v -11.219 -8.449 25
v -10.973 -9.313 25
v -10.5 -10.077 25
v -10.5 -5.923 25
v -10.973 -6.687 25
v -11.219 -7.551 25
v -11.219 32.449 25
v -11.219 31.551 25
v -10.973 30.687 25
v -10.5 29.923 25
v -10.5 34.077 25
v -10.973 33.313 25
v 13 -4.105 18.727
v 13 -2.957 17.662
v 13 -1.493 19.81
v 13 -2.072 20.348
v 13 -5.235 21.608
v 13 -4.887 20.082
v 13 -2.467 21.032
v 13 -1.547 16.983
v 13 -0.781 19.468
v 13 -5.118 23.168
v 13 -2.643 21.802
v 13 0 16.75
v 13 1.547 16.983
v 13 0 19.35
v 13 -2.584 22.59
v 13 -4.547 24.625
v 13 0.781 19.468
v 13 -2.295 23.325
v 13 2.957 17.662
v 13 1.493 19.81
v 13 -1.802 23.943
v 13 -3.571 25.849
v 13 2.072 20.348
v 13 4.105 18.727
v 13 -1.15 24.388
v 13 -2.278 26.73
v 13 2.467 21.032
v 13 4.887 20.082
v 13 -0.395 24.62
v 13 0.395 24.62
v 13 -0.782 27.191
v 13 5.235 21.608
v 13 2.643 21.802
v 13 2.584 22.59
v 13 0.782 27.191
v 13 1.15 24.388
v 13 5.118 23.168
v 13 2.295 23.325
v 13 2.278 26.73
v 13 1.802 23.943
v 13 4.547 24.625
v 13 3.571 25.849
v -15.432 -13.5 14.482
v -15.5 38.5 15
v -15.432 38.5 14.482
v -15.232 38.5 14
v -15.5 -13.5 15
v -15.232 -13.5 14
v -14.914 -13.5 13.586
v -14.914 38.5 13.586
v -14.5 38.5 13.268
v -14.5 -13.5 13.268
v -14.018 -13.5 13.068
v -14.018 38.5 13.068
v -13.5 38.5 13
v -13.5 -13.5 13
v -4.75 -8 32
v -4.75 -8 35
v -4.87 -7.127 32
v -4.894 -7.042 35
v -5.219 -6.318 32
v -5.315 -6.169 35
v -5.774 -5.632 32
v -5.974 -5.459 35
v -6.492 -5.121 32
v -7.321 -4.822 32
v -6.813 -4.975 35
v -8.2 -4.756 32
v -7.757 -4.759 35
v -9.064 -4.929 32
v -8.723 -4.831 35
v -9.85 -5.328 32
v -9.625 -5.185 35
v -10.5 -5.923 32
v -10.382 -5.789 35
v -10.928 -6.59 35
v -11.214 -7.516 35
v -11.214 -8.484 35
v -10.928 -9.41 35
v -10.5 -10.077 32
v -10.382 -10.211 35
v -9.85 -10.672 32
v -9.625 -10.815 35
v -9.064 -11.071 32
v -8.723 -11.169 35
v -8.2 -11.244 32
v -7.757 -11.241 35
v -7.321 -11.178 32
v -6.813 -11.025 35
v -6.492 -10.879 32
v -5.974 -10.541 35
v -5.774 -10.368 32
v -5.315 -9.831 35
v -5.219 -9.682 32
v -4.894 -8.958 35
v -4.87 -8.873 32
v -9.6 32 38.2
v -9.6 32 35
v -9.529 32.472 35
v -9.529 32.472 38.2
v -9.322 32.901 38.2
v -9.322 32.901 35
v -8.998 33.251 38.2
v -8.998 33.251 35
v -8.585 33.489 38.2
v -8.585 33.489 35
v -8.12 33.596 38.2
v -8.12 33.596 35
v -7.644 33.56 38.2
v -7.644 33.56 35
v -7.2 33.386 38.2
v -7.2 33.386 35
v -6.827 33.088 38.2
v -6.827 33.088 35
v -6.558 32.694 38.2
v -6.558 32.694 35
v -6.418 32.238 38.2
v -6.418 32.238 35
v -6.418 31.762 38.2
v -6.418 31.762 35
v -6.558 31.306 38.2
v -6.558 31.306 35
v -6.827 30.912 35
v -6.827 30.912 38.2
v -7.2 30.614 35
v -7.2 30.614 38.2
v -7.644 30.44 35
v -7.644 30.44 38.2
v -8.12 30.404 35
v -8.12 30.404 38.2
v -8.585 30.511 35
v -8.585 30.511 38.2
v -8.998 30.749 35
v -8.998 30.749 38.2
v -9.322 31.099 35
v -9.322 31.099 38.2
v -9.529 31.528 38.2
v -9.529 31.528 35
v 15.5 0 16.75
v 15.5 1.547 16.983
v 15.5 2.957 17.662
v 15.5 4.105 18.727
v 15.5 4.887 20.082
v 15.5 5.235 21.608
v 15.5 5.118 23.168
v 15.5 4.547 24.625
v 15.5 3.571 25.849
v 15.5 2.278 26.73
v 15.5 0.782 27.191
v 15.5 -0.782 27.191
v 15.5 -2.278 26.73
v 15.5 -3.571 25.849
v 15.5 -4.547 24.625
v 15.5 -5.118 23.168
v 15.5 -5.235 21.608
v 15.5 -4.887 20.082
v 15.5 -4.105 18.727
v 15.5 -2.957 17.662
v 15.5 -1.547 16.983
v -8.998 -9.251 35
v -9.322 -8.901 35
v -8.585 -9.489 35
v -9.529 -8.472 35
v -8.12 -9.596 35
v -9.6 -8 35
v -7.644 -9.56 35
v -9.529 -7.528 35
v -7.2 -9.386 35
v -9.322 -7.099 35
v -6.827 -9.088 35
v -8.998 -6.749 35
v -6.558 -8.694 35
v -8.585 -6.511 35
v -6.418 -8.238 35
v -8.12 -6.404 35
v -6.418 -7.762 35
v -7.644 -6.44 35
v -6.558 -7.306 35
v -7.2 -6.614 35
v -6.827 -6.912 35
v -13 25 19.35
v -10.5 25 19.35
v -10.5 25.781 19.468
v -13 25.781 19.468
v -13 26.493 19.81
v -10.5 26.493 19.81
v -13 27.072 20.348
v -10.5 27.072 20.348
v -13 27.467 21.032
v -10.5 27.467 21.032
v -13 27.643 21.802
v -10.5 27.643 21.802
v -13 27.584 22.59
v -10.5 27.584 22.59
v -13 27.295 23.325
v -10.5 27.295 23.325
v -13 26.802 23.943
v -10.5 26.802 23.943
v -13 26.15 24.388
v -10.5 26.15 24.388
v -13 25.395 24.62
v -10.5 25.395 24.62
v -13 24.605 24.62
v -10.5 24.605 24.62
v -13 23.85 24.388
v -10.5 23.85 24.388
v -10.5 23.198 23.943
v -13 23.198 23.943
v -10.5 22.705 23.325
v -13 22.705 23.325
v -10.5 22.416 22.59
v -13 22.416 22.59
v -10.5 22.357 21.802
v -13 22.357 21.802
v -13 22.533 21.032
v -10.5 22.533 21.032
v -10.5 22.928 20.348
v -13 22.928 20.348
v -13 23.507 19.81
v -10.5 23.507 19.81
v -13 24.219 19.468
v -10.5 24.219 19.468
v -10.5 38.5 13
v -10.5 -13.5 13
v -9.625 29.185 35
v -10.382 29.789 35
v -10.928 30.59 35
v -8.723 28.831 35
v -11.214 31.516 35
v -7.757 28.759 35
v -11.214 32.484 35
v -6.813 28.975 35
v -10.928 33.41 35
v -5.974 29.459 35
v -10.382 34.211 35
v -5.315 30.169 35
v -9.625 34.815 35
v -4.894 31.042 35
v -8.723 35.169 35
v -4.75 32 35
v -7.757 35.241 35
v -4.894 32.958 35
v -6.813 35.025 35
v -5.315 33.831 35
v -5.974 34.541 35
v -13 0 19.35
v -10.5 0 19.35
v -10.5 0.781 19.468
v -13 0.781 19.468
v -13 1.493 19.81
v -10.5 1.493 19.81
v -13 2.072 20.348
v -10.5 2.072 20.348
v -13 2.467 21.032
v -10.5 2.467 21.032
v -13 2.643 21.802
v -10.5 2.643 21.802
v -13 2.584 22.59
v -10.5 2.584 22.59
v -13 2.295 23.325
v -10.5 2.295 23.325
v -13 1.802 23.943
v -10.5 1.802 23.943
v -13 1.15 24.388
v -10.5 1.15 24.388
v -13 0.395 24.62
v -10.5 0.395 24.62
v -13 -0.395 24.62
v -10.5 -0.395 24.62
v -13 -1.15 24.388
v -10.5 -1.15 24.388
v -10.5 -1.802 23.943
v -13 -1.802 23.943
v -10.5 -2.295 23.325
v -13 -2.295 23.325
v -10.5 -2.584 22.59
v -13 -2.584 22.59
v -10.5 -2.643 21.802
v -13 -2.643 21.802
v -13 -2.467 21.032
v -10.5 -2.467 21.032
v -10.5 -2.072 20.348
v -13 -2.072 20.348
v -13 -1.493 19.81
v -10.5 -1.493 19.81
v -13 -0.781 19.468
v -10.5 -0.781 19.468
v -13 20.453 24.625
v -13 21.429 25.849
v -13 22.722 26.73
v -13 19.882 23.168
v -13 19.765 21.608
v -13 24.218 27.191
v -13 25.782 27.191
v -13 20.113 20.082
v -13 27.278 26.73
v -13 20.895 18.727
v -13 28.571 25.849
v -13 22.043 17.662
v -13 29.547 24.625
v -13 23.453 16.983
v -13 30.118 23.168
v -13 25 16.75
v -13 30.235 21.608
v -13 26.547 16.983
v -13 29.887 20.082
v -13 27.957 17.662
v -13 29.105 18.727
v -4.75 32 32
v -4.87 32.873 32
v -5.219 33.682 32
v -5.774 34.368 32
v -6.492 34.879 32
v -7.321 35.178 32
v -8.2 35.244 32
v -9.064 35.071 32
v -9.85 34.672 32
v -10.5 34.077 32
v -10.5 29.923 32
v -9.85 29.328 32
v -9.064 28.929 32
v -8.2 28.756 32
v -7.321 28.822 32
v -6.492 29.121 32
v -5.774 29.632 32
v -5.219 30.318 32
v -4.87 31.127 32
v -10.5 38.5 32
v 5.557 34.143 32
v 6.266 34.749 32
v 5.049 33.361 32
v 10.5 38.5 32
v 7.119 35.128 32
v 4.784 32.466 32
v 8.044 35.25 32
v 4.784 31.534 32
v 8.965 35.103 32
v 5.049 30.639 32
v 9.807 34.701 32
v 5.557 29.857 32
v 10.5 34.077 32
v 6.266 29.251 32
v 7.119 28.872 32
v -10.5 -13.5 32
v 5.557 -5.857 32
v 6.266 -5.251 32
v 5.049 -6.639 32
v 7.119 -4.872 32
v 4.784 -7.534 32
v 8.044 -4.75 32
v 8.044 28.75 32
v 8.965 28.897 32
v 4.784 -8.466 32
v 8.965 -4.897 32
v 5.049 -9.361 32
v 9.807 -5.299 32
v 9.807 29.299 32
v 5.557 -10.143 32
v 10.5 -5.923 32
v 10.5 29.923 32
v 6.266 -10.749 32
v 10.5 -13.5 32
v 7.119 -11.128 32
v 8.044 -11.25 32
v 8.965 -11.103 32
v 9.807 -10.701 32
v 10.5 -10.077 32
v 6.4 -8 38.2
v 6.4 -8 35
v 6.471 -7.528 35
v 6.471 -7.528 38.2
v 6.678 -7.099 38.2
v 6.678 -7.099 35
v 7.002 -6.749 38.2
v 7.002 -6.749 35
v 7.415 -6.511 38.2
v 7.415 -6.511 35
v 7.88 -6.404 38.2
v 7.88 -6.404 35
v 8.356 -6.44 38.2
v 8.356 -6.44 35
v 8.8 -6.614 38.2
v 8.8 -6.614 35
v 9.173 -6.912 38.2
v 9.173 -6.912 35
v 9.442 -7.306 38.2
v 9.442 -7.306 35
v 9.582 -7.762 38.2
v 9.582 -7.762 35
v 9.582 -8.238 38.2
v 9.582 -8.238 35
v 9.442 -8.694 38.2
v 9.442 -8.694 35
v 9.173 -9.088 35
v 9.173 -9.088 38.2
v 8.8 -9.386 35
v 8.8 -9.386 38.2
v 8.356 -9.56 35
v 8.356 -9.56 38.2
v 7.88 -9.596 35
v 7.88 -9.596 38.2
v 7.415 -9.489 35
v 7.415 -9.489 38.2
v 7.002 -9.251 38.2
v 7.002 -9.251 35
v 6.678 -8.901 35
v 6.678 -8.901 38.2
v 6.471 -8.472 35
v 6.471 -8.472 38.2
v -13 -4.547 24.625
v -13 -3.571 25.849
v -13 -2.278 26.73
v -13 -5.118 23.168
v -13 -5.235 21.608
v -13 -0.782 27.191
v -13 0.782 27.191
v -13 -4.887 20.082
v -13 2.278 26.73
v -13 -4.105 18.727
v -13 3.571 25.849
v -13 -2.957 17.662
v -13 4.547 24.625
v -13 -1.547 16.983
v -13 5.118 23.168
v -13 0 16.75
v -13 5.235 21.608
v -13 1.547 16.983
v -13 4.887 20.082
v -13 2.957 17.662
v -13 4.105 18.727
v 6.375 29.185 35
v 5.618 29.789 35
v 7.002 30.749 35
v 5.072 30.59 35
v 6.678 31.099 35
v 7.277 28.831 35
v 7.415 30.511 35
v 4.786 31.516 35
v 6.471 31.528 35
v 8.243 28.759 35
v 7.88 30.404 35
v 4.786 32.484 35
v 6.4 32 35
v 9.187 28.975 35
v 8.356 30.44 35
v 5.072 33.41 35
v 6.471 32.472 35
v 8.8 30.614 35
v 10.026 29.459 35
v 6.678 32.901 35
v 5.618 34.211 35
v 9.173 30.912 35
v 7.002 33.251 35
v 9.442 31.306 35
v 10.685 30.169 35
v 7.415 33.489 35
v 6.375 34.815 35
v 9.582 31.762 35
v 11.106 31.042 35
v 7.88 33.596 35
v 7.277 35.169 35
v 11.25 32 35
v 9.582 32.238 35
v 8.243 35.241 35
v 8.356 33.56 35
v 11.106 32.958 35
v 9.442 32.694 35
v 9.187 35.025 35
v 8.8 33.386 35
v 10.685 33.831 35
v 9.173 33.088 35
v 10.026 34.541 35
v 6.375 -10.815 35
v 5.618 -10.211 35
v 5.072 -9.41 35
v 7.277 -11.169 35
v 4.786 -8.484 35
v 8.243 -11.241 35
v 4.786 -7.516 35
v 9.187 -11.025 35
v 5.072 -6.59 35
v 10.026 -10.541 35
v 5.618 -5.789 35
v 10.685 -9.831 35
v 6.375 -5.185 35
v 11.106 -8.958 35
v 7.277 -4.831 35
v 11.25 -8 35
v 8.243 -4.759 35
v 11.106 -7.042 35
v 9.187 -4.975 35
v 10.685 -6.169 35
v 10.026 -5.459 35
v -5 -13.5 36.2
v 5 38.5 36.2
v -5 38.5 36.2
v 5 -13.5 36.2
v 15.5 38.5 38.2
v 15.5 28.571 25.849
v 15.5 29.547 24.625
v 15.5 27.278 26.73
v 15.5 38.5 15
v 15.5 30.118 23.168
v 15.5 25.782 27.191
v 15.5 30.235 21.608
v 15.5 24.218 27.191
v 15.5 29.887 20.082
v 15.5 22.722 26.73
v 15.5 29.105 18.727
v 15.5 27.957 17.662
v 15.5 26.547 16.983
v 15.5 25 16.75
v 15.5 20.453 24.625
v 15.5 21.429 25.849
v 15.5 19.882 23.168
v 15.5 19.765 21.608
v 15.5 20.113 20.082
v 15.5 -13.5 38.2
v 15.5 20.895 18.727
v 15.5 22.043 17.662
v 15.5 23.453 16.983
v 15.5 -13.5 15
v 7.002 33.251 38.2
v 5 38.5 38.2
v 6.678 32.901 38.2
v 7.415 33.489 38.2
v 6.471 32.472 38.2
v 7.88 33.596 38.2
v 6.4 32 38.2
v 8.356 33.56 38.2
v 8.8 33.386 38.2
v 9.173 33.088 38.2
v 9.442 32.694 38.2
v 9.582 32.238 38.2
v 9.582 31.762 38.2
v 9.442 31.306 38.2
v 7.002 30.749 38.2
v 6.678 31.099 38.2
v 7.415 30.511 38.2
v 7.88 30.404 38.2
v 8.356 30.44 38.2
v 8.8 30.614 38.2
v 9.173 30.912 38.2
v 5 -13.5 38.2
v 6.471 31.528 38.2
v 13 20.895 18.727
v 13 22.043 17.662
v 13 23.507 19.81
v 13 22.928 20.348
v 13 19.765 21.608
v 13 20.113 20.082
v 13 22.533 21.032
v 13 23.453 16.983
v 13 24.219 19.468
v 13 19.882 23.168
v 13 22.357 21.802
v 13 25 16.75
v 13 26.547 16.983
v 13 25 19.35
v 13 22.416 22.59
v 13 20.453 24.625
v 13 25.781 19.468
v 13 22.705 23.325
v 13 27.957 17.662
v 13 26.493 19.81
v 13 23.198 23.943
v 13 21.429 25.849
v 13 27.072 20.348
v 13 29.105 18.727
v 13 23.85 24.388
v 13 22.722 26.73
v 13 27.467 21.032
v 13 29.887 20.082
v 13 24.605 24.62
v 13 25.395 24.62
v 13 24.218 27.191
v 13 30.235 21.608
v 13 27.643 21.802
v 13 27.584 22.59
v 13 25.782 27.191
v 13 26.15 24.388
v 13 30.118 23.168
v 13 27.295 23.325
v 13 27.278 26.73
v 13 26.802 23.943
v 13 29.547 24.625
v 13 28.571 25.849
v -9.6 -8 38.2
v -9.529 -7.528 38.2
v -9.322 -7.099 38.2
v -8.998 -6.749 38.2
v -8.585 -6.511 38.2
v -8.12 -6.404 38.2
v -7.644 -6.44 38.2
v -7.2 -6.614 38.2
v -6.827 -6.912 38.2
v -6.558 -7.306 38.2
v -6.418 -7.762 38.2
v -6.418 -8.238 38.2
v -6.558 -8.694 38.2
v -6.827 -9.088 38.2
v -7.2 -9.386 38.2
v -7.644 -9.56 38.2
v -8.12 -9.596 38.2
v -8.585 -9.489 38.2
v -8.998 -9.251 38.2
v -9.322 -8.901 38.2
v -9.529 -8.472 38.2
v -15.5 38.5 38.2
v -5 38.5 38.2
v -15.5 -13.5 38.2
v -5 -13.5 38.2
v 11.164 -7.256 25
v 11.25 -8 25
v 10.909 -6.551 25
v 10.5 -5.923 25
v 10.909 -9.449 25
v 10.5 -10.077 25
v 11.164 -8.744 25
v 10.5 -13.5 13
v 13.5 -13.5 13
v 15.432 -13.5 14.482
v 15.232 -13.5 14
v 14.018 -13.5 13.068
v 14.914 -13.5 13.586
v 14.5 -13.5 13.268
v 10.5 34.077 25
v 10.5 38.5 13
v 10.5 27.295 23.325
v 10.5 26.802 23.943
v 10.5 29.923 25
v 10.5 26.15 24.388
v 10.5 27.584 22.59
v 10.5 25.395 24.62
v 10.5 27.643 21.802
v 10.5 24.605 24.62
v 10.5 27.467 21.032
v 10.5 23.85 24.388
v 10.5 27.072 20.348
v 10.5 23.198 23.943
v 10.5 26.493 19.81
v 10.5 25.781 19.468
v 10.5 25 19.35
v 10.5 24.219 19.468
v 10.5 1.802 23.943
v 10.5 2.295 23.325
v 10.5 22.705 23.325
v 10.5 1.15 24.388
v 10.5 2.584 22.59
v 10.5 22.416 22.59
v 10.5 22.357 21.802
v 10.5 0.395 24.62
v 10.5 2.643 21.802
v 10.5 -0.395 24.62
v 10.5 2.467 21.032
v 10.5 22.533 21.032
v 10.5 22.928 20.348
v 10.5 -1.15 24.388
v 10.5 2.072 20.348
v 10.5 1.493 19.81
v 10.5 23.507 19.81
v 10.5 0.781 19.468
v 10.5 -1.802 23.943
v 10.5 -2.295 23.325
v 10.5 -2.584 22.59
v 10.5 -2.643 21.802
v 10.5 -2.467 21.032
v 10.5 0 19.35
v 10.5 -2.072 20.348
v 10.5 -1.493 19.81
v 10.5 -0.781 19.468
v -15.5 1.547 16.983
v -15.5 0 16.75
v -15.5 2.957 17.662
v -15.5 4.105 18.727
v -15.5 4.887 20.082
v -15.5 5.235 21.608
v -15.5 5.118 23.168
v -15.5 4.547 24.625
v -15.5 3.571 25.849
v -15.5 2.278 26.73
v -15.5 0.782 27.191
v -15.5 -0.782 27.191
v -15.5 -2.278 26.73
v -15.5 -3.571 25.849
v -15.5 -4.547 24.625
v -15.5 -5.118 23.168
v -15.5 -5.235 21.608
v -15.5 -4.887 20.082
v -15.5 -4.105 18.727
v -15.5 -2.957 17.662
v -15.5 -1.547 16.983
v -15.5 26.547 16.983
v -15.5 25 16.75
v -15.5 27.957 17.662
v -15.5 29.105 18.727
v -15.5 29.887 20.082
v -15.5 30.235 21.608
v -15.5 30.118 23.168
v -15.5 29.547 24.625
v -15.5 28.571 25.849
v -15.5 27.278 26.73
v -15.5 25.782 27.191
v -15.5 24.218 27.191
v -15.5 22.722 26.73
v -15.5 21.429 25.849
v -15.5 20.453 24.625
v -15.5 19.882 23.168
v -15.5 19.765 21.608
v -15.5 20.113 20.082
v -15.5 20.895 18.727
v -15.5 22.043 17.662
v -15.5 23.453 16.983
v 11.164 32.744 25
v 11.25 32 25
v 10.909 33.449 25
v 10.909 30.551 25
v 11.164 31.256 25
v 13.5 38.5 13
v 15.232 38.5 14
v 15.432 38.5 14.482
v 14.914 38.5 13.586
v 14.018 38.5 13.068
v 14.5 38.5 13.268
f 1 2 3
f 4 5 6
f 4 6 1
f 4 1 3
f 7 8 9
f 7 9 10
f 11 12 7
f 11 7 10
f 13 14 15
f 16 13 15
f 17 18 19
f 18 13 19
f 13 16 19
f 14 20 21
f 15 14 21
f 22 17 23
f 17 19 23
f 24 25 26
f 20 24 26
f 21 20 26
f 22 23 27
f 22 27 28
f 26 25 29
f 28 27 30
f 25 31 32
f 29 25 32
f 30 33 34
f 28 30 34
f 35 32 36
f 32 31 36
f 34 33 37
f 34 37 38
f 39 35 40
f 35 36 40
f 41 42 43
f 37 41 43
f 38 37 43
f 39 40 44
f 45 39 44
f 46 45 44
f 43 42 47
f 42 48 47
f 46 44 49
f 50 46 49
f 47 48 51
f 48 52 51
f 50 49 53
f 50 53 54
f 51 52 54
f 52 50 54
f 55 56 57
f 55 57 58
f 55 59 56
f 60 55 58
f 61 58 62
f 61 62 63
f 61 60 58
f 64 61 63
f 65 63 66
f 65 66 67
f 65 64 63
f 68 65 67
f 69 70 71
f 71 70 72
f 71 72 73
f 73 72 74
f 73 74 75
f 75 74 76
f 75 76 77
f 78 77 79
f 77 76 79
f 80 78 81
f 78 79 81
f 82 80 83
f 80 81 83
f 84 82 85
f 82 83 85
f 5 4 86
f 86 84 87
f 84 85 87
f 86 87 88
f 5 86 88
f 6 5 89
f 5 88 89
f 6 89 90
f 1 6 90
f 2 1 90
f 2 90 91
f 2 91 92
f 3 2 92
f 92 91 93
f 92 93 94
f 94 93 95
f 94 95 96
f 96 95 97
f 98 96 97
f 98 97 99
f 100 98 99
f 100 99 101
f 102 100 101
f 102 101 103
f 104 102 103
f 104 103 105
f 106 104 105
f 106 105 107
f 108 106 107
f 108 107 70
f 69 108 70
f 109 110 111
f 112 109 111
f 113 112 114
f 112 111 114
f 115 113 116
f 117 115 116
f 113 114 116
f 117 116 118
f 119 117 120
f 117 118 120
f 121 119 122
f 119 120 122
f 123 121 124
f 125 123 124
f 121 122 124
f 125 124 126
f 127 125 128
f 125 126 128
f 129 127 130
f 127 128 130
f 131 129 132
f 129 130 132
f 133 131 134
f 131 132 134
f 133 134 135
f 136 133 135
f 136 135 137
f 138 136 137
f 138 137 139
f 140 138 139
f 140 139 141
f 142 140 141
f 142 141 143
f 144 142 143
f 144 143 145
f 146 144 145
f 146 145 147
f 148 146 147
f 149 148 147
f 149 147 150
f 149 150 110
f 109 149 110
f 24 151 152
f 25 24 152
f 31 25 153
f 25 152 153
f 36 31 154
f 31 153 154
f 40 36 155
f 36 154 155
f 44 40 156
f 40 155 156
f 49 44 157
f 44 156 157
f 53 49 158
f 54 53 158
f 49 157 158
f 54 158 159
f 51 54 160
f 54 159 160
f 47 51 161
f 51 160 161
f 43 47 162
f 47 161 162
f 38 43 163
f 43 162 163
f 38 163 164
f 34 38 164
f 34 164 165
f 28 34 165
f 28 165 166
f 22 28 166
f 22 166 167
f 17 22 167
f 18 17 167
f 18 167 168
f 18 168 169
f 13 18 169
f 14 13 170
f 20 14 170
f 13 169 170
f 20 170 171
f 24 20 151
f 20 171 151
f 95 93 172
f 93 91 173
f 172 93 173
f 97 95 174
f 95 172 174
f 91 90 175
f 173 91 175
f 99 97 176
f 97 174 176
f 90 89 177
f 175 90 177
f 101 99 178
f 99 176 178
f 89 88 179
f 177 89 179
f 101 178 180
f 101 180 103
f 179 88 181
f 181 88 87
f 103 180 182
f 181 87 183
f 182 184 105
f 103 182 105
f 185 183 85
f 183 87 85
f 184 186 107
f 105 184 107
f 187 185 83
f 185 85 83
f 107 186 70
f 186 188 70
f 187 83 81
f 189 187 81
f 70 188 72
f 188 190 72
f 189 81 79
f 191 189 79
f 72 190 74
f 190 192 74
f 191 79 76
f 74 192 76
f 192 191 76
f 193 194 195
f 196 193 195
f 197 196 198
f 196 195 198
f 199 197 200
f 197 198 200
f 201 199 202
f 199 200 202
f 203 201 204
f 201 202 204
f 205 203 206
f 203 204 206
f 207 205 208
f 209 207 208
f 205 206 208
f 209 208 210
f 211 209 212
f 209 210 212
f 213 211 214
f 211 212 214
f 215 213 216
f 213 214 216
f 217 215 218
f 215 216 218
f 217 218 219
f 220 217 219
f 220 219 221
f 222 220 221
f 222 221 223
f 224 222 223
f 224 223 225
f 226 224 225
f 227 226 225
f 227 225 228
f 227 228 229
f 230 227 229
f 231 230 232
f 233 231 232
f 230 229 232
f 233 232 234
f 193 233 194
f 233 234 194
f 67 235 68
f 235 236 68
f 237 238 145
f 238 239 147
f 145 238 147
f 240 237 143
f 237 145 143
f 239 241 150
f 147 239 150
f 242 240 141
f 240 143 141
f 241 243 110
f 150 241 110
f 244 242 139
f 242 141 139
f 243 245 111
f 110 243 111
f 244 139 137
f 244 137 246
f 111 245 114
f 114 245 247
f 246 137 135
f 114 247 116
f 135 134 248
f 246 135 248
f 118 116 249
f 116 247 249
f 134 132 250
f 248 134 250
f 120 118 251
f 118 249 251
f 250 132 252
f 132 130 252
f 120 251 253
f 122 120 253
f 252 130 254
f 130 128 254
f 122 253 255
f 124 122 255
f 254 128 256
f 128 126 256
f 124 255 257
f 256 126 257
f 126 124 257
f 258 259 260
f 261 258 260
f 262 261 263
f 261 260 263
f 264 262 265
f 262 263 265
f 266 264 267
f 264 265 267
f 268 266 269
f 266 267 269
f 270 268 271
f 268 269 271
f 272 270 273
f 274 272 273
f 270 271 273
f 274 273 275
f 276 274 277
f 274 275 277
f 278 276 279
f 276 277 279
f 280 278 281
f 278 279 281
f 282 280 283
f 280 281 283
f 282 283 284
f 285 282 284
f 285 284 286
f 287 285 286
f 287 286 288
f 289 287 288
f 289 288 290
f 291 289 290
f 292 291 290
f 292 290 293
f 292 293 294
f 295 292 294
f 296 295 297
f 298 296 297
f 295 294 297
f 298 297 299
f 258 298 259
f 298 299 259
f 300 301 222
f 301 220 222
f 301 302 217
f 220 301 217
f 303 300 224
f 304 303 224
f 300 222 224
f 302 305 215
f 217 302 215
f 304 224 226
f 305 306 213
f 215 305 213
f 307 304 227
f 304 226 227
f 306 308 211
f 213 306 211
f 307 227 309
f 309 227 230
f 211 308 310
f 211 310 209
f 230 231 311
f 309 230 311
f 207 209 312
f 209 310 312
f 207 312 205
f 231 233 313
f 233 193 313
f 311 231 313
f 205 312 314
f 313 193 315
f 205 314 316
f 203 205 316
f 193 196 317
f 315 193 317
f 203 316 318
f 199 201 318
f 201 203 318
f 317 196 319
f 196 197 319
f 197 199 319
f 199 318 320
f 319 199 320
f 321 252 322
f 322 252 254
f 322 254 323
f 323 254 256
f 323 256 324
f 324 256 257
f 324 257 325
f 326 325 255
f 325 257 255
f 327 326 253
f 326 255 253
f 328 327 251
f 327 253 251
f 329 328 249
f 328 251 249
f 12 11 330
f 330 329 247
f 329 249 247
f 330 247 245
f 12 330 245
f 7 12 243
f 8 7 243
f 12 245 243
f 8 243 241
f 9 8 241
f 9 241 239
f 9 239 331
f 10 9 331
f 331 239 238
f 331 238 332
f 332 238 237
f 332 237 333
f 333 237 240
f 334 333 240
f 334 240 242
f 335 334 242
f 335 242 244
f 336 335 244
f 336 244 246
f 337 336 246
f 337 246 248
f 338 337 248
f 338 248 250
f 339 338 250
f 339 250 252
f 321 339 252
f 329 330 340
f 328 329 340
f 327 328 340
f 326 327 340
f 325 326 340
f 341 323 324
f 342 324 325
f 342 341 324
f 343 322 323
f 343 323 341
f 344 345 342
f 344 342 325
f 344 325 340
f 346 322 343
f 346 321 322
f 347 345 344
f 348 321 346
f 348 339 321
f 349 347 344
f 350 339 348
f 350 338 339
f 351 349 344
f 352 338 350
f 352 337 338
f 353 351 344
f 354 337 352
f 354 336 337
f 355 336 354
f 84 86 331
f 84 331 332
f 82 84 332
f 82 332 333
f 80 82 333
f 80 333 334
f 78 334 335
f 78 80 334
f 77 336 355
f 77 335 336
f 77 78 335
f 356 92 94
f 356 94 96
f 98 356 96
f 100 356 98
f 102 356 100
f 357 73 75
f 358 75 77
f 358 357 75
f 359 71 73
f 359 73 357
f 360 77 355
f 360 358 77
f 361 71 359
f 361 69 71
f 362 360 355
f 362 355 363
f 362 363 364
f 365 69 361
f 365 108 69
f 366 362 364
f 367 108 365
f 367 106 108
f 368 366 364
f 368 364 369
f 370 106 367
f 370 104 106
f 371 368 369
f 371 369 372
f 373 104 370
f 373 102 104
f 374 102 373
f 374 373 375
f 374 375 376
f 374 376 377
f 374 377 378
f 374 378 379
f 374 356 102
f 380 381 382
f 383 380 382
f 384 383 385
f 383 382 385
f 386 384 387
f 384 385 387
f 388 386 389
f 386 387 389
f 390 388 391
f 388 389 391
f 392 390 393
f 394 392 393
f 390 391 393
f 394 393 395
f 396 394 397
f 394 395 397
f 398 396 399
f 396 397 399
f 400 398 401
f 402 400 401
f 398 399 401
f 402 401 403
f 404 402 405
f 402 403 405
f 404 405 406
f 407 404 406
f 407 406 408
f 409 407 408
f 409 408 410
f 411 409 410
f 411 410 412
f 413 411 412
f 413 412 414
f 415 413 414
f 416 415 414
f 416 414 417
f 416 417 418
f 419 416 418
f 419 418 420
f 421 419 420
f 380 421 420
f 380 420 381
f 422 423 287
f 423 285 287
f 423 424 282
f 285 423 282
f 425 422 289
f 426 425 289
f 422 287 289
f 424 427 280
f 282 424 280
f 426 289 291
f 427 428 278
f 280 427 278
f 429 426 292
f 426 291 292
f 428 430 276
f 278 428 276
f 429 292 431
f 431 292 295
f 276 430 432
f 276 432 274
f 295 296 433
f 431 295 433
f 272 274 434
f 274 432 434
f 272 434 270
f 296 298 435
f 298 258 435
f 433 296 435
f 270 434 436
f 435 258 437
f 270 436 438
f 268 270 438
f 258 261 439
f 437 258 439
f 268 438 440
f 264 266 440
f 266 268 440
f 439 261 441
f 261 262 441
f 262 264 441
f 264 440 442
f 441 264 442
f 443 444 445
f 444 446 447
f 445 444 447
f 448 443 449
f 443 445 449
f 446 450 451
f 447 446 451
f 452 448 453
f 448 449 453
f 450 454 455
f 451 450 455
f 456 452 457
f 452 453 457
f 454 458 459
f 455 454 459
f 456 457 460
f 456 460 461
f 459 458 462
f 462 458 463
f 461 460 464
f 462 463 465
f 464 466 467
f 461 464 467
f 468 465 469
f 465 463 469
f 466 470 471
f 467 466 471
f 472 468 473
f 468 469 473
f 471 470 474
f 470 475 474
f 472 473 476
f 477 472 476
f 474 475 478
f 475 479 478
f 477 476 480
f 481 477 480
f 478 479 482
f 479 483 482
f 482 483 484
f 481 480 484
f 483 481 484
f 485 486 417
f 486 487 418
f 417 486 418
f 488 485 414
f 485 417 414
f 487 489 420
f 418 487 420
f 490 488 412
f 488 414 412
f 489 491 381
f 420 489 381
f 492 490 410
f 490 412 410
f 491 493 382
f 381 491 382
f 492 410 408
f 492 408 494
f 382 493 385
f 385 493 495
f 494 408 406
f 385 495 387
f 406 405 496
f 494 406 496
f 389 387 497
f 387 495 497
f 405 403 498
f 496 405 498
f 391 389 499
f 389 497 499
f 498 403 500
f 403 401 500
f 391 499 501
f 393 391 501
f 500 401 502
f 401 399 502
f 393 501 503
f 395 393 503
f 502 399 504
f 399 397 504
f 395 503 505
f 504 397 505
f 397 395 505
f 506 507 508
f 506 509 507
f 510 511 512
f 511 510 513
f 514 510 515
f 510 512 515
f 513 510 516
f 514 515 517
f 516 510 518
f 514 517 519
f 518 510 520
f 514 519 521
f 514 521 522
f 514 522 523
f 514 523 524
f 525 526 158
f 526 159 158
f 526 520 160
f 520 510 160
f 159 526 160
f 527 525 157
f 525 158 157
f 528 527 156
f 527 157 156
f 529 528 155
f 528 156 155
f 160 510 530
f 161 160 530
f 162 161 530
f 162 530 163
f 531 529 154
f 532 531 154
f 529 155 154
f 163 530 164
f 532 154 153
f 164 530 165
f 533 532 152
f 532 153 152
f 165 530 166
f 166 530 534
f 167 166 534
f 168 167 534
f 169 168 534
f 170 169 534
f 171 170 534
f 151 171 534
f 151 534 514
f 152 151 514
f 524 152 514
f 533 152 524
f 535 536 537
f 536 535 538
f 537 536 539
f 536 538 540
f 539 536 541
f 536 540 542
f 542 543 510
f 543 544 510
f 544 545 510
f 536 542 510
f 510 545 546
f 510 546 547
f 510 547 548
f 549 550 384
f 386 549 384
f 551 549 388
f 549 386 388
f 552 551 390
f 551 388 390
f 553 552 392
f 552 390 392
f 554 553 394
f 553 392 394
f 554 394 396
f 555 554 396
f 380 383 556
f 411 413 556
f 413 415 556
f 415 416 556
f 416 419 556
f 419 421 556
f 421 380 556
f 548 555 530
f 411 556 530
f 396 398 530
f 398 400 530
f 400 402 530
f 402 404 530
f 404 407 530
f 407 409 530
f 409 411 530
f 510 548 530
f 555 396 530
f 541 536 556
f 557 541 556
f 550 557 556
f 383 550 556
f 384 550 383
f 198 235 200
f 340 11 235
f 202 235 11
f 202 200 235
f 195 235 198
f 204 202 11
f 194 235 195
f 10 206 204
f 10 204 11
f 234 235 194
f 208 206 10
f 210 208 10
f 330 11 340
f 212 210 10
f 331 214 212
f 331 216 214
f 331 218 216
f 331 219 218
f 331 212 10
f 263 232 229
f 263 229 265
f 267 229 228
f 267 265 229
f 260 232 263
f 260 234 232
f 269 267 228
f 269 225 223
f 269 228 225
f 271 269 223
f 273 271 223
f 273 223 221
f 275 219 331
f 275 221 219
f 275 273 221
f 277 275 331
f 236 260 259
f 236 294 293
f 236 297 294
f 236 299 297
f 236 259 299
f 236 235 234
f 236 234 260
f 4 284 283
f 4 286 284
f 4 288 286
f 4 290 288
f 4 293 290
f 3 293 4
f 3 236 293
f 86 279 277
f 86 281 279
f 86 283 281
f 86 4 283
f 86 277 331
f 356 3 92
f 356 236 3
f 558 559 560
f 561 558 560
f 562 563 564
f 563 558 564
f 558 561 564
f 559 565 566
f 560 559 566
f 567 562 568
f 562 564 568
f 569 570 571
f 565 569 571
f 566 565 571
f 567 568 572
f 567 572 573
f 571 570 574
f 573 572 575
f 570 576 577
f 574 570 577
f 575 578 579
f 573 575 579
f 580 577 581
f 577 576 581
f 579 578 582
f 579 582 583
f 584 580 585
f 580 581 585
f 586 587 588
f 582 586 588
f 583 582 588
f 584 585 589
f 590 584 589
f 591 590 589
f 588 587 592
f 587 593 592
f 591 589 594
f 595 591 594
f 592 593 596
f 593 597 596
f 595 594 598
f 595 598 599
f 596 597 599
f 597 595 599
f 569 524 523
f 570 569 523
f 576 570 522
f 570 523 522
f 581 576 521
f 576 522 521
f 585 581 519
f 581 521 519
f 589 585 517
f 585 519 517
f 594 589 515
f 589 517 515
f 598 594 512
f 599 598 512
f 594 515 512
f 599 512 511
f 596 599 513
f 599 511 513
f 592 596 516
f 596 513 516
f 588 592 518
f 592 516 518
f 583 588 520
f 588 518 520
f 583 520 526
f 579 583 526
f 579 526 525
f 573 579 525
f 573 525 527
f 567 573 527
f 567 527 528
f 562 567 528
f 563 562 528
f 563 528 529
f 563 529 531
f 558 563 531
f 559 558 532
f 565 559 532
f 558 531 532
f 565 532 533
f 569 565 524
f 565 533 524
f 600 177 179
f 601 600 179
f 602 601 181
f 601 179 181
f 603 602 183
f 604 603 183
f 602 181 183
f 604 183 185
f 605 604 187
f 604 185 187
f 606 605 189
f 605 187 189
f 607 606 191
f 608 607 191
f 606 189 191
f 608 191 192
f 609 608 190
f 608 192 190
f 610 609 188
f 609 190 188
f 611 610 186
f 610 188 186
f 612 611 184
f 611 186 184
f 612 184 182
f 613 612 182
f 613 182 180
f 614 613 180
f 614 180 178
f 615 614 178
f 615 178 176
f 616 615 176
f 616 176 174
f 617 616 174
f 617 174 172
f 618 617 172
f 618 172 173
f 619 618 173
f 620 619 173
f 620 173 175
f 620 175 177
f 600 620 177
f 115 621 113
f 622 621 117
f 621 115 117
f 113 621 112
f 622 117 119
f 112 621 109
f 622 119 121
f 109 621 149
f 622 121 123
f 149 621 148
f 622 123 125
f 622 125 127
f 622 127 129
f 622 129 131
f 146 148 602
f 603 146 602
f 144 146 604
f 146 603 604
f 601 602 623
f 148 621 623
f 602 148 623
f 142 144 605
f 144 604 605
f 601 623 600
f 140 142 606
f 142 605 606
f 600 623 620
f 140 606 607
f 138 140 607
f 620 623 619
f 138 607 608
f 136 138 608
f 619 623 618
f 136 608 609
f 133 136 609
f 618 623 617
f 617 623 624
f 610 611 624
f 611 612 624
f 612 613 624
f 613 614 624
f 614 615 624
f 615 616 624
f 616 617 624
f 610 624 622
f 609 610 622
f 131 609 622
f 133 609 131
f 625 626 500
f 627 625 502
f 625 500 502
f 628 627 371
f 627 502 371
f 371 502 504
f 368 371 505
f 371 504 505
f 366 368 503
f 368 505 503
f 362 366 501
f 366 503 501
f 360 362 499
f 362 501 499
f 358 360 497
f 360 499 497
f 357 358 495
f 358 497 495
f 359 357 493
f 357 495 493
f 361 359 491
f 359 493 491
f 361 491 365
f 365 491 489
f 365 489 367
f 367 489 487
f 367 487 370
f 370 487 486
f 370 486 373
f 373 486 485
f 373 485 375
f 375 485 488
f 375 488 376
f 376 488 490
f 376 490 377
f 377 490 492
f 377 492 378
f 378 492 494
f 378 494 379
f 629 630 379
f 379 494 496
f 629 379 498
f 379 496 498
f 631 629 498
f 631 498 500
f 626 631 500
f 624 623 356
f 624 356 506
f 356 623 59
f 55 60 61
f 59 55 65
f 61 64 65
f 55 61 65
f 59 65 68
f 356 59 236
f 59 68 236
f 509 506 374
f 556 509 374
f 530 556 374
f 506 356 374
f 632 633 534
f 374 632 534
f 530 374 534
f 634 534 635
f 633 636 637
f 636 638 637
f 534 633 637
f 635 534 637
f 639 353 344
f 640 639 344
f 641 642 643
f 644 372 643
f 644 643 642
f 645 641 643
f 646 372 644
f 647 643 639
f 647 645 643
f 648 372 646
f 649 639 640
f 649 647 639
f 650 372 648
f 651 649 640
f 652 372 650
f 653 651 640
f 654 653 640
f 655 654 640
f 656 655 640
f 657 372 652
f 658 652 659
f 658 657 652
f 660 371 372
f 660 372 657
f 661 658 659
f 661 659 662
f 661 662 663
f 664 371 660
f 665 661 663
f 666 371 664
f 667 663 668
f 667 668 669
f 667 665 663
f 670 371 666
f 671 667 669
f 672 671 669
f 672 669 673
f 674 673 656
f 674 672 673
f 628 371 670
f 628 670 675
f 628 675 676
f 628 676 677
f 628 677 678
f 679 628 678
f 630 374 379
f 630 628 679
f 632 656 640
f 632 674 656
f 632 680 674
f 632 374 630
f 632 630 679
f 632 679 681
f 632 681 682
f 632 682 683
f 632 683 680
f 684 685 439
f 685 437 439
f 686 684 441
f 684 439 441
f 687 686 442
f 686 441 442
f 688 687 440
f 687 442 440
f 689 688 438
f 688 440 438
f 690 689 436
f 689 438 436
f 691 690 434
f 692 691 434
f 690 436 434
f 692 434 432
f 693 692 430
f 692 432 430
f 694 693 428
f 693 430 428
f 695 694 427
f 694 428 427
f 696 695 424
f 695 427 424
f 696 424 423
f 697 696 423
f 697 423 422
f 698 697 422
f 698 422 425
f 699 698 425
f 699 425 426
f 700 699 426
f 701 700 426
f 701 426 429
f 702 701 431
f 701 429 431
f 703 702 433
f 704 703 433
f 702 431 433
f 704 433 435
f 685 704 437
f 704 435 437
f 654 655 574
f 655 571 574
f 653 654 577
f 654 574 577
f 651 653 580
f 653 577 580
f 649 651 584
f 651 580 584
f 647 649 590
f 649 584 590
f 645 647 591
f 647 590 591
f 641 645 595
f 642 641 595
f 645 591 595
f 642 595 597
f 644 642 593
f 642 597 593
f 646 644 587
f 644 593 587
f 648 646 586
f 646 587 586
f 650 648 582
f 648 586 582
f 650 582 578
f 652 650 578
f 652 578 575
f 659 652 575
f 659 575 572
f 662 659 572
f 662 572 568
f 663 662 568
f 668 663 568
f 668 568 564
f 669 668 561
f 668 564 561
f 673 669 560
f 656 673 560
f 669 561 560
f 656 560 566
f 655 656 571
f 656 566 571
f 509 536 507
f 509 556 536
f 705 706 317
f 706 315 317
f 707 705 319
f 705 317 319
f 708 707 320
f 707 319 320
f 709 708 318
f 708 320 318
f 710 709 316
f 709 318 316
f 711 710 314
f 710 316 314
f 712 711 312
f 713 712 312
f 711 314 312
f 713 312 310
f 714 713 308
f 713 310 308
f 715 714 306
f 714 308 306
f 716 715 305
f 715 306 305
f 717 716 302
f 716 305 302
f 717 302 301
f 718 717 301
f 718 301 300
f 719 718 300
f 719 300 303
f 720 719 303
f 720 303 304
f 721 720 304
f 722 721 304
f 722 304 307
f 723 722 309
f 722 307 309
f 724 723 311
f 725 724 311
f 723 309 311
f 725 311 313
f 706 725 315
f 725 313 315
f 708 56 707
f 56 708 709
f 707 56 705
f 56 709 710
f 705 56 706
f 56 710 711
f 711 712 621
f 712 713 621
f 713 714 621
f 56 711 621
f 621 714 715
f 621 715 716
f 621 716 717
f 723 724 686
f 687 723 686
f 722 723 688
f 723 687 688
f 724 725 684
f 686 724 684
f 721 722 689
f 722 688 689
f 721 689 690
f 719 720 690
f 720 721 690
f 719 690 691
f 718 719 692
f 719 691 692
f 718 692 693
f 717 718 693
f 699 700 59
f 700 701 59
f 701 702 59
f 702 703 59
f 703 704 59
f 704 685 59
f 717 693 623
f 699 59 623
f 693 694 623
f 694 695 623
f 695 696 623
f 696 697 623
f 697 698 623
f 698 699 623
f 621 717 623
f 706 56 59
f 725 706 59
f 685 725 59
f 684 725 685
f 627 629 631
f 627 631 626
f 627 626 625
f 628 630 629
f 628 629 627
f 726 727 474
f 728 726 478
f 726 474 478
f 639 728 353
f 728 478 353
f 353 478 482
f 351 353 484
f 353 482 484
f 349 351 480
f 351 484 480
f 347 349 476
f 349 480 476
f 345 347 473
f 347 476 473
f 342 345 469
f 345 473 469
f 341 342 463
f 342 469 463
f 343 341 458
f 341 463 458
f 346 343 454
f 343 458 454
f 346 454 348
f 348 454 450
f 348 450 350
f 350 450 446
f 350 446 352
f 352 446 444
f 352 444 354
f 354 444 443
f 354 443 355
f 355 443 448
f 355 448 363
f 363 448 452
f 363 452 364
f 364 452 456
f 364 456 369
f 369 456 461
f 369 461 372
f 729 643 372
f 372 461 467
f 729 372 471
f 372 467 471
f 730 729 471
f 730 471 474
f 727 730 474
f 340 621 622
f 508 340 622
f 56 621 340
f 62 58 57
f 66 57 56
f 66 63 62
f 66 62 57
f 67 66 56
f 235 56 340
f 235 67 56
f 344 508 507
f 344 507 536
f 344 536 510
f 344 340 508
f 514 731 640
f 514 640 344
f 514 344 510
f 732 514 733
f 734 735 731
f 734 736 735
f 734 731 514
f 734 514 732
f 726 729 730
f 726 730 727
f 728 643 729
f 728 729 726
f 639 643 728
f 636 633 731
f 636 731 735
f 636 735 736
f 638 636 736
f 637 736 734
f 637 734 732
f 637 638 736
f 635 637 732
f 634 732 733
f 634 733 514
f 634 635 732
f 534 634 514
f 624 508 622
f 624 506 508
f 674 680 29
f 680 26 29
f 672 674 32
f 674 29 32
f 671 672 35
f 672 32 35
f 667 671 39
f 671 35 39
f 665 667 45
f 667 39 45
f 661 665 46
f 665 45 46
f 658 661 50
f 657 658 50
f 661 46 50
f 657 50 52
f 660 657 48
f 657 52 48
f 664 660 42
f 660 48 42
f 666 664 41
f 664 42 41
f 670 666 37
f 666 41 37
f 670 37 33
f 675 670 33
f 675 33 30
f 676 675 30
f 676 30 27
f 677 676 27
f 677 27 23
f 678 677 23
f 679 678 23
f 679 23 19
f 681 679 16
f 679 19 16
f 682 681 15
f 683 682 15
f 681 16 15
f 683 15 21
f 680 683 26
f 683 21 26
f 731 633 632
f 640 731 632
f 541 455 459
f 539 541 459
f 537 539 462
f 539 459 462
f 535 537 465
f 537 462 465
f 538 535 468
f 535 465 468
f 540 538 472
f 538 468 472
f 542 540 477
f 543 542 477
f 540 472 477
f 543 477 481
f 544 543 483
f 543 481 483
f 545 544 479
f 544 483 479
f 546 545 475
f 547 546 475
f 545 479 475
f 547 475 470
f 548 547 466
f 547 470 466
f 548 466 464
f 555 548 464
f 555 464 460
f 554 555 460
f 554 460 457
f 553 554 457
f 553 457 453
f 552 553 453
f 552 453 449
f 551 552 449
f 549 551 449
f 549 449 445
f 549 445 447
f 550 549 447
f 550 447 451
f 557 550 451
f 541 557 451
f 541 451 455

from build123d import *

# Parameters (mm, degrees)
PAD031_DEPTH            = 13.5
PAD031_DEPTH_BACK       = 38.5
SKETCH097_R             = 1.6
POCKET050_DEPTH         = 6.201
POCKET050_DEPTH_BACK    = 19.001
SKETCH100_R             = 3.25
POCKET051_DEPTH         = 10
LINEARPATTERN_COUNT     = 2
LINEARPATTERN_PITCH     = 25
BODY029_PLACEMENT_ANGLE = 180


with BuildPart() as part:
    # Sketch099 → Pad031 (new body, two sides)
    with BuildSketch(Plane.XZ) as pad031_sk:
        with BuildLine():
            Line((-13.5, 19), (-10.5, 19))
            Line((-10.5, 0), (-10.5, 19))
            Line((10.5, 0), (-10.5, 0))
            Line((10.5, 19), (10.5, 0))
            Line((10.5, 19), (13.5, 19))
            ThreePointArc((15.5, 17), (14.914214, 18.414214), (13.5, 19))
            Line((15.5, 17), (15.5, -6.2))
            Line((15.5, -6.2), (5, -6.2))
            Line((5, -4.2), (5, -6.2))
            Line((-5, -4.2), (5, -4.2))
            Line((-5, -6.2), (-5, -4.2))
            Line((-5, -6.2), (-15.5, -6.2))
            Line((-15.5, -6.2), (-15.5, 17))
            ThreePointArc((-13.5, 19), (-14.914214, 18.414214), (-15.5, 17))
        make_face()
    extrude(amount=PAD031_DEPTH)
    extrude(pad031_sk.sketch, amount=-PAD031_DEPTH_BACK)

    # Sketch097 → Pocket050 (cut, two sides)
    with BuildSketch(Plane.XY) as pocket050_sk:
        with Locations((-8, 32)):
            Circle(SKETCH097_R)
        with Locations((8, 32)):
            Circle(SKETCH097_R)
        with Locations((-8, -8)):
            Circle(SKETCH097_R)
        with Locations((8, -8)):
            Circle(SKETCH097_R)
    extrude(amount=-POCKET050_DEPTH, mode=Mode.SUBTRACT)
    extrude(pocket050_sk.sketch, amount=POCKET050_DEPTH_BACK, mode=Mode.SUBTRACT)

    # Sketch100 → Pocket051 (cut)
    with BuildSketch(Plane(origin=(0, 0, -3), x_dir=(-1, 0, 0), z_dir=(0, 0, -1))):
        with Locations((-8, 32)):
            Circle(SKETCH100_R)
        with Locations((8, 32)):
            Circle(SKETCH100_R)
        with Locations((-8, -8)):
            Circle(SKETCH100_R)
        with Locations((8, -8)):
            Circle(SKETCH100_R)
    extrude(amount=-POCKET051_DEPTH, mode=Mode.SUBTRACT)

    # Sketch110 → Groove (revolve, cut)
    with BuildSketch(Plane(origin=(0, 0, 10), x_dir=(-1, 0, 0), z_dir=(0, 1, 0))):
        Polygon((-13, 2.65), (13, 2.65), (13, 5.25), (23, 5.25), (23, 0), (-23, 0), (-23, 5.25), (-13, 5.25), align=None)
    groove = revolve(axis=Axis((0, 0, 10), (-1, 0, 0)), mode=Mode.SUBTRACT)

    # LinearPattern: Groove ×2
    with Locations(*[(0, i * LINEARPATTERN_PITCH, 0) for i in range(1, LINEARPATTERN_COUNT)]):
        add(groove, mode=Mode.SUBTRACT)


with BuildPart() as part_1:
    # Body029 placement: moved
    add(part.part.moved(Location((0, 0, 32))).rotate(Axis((0, 0, 32), (0, 1, 0)), BODY029_PLACEMENT_ANGLE))


solid = part_1.part
